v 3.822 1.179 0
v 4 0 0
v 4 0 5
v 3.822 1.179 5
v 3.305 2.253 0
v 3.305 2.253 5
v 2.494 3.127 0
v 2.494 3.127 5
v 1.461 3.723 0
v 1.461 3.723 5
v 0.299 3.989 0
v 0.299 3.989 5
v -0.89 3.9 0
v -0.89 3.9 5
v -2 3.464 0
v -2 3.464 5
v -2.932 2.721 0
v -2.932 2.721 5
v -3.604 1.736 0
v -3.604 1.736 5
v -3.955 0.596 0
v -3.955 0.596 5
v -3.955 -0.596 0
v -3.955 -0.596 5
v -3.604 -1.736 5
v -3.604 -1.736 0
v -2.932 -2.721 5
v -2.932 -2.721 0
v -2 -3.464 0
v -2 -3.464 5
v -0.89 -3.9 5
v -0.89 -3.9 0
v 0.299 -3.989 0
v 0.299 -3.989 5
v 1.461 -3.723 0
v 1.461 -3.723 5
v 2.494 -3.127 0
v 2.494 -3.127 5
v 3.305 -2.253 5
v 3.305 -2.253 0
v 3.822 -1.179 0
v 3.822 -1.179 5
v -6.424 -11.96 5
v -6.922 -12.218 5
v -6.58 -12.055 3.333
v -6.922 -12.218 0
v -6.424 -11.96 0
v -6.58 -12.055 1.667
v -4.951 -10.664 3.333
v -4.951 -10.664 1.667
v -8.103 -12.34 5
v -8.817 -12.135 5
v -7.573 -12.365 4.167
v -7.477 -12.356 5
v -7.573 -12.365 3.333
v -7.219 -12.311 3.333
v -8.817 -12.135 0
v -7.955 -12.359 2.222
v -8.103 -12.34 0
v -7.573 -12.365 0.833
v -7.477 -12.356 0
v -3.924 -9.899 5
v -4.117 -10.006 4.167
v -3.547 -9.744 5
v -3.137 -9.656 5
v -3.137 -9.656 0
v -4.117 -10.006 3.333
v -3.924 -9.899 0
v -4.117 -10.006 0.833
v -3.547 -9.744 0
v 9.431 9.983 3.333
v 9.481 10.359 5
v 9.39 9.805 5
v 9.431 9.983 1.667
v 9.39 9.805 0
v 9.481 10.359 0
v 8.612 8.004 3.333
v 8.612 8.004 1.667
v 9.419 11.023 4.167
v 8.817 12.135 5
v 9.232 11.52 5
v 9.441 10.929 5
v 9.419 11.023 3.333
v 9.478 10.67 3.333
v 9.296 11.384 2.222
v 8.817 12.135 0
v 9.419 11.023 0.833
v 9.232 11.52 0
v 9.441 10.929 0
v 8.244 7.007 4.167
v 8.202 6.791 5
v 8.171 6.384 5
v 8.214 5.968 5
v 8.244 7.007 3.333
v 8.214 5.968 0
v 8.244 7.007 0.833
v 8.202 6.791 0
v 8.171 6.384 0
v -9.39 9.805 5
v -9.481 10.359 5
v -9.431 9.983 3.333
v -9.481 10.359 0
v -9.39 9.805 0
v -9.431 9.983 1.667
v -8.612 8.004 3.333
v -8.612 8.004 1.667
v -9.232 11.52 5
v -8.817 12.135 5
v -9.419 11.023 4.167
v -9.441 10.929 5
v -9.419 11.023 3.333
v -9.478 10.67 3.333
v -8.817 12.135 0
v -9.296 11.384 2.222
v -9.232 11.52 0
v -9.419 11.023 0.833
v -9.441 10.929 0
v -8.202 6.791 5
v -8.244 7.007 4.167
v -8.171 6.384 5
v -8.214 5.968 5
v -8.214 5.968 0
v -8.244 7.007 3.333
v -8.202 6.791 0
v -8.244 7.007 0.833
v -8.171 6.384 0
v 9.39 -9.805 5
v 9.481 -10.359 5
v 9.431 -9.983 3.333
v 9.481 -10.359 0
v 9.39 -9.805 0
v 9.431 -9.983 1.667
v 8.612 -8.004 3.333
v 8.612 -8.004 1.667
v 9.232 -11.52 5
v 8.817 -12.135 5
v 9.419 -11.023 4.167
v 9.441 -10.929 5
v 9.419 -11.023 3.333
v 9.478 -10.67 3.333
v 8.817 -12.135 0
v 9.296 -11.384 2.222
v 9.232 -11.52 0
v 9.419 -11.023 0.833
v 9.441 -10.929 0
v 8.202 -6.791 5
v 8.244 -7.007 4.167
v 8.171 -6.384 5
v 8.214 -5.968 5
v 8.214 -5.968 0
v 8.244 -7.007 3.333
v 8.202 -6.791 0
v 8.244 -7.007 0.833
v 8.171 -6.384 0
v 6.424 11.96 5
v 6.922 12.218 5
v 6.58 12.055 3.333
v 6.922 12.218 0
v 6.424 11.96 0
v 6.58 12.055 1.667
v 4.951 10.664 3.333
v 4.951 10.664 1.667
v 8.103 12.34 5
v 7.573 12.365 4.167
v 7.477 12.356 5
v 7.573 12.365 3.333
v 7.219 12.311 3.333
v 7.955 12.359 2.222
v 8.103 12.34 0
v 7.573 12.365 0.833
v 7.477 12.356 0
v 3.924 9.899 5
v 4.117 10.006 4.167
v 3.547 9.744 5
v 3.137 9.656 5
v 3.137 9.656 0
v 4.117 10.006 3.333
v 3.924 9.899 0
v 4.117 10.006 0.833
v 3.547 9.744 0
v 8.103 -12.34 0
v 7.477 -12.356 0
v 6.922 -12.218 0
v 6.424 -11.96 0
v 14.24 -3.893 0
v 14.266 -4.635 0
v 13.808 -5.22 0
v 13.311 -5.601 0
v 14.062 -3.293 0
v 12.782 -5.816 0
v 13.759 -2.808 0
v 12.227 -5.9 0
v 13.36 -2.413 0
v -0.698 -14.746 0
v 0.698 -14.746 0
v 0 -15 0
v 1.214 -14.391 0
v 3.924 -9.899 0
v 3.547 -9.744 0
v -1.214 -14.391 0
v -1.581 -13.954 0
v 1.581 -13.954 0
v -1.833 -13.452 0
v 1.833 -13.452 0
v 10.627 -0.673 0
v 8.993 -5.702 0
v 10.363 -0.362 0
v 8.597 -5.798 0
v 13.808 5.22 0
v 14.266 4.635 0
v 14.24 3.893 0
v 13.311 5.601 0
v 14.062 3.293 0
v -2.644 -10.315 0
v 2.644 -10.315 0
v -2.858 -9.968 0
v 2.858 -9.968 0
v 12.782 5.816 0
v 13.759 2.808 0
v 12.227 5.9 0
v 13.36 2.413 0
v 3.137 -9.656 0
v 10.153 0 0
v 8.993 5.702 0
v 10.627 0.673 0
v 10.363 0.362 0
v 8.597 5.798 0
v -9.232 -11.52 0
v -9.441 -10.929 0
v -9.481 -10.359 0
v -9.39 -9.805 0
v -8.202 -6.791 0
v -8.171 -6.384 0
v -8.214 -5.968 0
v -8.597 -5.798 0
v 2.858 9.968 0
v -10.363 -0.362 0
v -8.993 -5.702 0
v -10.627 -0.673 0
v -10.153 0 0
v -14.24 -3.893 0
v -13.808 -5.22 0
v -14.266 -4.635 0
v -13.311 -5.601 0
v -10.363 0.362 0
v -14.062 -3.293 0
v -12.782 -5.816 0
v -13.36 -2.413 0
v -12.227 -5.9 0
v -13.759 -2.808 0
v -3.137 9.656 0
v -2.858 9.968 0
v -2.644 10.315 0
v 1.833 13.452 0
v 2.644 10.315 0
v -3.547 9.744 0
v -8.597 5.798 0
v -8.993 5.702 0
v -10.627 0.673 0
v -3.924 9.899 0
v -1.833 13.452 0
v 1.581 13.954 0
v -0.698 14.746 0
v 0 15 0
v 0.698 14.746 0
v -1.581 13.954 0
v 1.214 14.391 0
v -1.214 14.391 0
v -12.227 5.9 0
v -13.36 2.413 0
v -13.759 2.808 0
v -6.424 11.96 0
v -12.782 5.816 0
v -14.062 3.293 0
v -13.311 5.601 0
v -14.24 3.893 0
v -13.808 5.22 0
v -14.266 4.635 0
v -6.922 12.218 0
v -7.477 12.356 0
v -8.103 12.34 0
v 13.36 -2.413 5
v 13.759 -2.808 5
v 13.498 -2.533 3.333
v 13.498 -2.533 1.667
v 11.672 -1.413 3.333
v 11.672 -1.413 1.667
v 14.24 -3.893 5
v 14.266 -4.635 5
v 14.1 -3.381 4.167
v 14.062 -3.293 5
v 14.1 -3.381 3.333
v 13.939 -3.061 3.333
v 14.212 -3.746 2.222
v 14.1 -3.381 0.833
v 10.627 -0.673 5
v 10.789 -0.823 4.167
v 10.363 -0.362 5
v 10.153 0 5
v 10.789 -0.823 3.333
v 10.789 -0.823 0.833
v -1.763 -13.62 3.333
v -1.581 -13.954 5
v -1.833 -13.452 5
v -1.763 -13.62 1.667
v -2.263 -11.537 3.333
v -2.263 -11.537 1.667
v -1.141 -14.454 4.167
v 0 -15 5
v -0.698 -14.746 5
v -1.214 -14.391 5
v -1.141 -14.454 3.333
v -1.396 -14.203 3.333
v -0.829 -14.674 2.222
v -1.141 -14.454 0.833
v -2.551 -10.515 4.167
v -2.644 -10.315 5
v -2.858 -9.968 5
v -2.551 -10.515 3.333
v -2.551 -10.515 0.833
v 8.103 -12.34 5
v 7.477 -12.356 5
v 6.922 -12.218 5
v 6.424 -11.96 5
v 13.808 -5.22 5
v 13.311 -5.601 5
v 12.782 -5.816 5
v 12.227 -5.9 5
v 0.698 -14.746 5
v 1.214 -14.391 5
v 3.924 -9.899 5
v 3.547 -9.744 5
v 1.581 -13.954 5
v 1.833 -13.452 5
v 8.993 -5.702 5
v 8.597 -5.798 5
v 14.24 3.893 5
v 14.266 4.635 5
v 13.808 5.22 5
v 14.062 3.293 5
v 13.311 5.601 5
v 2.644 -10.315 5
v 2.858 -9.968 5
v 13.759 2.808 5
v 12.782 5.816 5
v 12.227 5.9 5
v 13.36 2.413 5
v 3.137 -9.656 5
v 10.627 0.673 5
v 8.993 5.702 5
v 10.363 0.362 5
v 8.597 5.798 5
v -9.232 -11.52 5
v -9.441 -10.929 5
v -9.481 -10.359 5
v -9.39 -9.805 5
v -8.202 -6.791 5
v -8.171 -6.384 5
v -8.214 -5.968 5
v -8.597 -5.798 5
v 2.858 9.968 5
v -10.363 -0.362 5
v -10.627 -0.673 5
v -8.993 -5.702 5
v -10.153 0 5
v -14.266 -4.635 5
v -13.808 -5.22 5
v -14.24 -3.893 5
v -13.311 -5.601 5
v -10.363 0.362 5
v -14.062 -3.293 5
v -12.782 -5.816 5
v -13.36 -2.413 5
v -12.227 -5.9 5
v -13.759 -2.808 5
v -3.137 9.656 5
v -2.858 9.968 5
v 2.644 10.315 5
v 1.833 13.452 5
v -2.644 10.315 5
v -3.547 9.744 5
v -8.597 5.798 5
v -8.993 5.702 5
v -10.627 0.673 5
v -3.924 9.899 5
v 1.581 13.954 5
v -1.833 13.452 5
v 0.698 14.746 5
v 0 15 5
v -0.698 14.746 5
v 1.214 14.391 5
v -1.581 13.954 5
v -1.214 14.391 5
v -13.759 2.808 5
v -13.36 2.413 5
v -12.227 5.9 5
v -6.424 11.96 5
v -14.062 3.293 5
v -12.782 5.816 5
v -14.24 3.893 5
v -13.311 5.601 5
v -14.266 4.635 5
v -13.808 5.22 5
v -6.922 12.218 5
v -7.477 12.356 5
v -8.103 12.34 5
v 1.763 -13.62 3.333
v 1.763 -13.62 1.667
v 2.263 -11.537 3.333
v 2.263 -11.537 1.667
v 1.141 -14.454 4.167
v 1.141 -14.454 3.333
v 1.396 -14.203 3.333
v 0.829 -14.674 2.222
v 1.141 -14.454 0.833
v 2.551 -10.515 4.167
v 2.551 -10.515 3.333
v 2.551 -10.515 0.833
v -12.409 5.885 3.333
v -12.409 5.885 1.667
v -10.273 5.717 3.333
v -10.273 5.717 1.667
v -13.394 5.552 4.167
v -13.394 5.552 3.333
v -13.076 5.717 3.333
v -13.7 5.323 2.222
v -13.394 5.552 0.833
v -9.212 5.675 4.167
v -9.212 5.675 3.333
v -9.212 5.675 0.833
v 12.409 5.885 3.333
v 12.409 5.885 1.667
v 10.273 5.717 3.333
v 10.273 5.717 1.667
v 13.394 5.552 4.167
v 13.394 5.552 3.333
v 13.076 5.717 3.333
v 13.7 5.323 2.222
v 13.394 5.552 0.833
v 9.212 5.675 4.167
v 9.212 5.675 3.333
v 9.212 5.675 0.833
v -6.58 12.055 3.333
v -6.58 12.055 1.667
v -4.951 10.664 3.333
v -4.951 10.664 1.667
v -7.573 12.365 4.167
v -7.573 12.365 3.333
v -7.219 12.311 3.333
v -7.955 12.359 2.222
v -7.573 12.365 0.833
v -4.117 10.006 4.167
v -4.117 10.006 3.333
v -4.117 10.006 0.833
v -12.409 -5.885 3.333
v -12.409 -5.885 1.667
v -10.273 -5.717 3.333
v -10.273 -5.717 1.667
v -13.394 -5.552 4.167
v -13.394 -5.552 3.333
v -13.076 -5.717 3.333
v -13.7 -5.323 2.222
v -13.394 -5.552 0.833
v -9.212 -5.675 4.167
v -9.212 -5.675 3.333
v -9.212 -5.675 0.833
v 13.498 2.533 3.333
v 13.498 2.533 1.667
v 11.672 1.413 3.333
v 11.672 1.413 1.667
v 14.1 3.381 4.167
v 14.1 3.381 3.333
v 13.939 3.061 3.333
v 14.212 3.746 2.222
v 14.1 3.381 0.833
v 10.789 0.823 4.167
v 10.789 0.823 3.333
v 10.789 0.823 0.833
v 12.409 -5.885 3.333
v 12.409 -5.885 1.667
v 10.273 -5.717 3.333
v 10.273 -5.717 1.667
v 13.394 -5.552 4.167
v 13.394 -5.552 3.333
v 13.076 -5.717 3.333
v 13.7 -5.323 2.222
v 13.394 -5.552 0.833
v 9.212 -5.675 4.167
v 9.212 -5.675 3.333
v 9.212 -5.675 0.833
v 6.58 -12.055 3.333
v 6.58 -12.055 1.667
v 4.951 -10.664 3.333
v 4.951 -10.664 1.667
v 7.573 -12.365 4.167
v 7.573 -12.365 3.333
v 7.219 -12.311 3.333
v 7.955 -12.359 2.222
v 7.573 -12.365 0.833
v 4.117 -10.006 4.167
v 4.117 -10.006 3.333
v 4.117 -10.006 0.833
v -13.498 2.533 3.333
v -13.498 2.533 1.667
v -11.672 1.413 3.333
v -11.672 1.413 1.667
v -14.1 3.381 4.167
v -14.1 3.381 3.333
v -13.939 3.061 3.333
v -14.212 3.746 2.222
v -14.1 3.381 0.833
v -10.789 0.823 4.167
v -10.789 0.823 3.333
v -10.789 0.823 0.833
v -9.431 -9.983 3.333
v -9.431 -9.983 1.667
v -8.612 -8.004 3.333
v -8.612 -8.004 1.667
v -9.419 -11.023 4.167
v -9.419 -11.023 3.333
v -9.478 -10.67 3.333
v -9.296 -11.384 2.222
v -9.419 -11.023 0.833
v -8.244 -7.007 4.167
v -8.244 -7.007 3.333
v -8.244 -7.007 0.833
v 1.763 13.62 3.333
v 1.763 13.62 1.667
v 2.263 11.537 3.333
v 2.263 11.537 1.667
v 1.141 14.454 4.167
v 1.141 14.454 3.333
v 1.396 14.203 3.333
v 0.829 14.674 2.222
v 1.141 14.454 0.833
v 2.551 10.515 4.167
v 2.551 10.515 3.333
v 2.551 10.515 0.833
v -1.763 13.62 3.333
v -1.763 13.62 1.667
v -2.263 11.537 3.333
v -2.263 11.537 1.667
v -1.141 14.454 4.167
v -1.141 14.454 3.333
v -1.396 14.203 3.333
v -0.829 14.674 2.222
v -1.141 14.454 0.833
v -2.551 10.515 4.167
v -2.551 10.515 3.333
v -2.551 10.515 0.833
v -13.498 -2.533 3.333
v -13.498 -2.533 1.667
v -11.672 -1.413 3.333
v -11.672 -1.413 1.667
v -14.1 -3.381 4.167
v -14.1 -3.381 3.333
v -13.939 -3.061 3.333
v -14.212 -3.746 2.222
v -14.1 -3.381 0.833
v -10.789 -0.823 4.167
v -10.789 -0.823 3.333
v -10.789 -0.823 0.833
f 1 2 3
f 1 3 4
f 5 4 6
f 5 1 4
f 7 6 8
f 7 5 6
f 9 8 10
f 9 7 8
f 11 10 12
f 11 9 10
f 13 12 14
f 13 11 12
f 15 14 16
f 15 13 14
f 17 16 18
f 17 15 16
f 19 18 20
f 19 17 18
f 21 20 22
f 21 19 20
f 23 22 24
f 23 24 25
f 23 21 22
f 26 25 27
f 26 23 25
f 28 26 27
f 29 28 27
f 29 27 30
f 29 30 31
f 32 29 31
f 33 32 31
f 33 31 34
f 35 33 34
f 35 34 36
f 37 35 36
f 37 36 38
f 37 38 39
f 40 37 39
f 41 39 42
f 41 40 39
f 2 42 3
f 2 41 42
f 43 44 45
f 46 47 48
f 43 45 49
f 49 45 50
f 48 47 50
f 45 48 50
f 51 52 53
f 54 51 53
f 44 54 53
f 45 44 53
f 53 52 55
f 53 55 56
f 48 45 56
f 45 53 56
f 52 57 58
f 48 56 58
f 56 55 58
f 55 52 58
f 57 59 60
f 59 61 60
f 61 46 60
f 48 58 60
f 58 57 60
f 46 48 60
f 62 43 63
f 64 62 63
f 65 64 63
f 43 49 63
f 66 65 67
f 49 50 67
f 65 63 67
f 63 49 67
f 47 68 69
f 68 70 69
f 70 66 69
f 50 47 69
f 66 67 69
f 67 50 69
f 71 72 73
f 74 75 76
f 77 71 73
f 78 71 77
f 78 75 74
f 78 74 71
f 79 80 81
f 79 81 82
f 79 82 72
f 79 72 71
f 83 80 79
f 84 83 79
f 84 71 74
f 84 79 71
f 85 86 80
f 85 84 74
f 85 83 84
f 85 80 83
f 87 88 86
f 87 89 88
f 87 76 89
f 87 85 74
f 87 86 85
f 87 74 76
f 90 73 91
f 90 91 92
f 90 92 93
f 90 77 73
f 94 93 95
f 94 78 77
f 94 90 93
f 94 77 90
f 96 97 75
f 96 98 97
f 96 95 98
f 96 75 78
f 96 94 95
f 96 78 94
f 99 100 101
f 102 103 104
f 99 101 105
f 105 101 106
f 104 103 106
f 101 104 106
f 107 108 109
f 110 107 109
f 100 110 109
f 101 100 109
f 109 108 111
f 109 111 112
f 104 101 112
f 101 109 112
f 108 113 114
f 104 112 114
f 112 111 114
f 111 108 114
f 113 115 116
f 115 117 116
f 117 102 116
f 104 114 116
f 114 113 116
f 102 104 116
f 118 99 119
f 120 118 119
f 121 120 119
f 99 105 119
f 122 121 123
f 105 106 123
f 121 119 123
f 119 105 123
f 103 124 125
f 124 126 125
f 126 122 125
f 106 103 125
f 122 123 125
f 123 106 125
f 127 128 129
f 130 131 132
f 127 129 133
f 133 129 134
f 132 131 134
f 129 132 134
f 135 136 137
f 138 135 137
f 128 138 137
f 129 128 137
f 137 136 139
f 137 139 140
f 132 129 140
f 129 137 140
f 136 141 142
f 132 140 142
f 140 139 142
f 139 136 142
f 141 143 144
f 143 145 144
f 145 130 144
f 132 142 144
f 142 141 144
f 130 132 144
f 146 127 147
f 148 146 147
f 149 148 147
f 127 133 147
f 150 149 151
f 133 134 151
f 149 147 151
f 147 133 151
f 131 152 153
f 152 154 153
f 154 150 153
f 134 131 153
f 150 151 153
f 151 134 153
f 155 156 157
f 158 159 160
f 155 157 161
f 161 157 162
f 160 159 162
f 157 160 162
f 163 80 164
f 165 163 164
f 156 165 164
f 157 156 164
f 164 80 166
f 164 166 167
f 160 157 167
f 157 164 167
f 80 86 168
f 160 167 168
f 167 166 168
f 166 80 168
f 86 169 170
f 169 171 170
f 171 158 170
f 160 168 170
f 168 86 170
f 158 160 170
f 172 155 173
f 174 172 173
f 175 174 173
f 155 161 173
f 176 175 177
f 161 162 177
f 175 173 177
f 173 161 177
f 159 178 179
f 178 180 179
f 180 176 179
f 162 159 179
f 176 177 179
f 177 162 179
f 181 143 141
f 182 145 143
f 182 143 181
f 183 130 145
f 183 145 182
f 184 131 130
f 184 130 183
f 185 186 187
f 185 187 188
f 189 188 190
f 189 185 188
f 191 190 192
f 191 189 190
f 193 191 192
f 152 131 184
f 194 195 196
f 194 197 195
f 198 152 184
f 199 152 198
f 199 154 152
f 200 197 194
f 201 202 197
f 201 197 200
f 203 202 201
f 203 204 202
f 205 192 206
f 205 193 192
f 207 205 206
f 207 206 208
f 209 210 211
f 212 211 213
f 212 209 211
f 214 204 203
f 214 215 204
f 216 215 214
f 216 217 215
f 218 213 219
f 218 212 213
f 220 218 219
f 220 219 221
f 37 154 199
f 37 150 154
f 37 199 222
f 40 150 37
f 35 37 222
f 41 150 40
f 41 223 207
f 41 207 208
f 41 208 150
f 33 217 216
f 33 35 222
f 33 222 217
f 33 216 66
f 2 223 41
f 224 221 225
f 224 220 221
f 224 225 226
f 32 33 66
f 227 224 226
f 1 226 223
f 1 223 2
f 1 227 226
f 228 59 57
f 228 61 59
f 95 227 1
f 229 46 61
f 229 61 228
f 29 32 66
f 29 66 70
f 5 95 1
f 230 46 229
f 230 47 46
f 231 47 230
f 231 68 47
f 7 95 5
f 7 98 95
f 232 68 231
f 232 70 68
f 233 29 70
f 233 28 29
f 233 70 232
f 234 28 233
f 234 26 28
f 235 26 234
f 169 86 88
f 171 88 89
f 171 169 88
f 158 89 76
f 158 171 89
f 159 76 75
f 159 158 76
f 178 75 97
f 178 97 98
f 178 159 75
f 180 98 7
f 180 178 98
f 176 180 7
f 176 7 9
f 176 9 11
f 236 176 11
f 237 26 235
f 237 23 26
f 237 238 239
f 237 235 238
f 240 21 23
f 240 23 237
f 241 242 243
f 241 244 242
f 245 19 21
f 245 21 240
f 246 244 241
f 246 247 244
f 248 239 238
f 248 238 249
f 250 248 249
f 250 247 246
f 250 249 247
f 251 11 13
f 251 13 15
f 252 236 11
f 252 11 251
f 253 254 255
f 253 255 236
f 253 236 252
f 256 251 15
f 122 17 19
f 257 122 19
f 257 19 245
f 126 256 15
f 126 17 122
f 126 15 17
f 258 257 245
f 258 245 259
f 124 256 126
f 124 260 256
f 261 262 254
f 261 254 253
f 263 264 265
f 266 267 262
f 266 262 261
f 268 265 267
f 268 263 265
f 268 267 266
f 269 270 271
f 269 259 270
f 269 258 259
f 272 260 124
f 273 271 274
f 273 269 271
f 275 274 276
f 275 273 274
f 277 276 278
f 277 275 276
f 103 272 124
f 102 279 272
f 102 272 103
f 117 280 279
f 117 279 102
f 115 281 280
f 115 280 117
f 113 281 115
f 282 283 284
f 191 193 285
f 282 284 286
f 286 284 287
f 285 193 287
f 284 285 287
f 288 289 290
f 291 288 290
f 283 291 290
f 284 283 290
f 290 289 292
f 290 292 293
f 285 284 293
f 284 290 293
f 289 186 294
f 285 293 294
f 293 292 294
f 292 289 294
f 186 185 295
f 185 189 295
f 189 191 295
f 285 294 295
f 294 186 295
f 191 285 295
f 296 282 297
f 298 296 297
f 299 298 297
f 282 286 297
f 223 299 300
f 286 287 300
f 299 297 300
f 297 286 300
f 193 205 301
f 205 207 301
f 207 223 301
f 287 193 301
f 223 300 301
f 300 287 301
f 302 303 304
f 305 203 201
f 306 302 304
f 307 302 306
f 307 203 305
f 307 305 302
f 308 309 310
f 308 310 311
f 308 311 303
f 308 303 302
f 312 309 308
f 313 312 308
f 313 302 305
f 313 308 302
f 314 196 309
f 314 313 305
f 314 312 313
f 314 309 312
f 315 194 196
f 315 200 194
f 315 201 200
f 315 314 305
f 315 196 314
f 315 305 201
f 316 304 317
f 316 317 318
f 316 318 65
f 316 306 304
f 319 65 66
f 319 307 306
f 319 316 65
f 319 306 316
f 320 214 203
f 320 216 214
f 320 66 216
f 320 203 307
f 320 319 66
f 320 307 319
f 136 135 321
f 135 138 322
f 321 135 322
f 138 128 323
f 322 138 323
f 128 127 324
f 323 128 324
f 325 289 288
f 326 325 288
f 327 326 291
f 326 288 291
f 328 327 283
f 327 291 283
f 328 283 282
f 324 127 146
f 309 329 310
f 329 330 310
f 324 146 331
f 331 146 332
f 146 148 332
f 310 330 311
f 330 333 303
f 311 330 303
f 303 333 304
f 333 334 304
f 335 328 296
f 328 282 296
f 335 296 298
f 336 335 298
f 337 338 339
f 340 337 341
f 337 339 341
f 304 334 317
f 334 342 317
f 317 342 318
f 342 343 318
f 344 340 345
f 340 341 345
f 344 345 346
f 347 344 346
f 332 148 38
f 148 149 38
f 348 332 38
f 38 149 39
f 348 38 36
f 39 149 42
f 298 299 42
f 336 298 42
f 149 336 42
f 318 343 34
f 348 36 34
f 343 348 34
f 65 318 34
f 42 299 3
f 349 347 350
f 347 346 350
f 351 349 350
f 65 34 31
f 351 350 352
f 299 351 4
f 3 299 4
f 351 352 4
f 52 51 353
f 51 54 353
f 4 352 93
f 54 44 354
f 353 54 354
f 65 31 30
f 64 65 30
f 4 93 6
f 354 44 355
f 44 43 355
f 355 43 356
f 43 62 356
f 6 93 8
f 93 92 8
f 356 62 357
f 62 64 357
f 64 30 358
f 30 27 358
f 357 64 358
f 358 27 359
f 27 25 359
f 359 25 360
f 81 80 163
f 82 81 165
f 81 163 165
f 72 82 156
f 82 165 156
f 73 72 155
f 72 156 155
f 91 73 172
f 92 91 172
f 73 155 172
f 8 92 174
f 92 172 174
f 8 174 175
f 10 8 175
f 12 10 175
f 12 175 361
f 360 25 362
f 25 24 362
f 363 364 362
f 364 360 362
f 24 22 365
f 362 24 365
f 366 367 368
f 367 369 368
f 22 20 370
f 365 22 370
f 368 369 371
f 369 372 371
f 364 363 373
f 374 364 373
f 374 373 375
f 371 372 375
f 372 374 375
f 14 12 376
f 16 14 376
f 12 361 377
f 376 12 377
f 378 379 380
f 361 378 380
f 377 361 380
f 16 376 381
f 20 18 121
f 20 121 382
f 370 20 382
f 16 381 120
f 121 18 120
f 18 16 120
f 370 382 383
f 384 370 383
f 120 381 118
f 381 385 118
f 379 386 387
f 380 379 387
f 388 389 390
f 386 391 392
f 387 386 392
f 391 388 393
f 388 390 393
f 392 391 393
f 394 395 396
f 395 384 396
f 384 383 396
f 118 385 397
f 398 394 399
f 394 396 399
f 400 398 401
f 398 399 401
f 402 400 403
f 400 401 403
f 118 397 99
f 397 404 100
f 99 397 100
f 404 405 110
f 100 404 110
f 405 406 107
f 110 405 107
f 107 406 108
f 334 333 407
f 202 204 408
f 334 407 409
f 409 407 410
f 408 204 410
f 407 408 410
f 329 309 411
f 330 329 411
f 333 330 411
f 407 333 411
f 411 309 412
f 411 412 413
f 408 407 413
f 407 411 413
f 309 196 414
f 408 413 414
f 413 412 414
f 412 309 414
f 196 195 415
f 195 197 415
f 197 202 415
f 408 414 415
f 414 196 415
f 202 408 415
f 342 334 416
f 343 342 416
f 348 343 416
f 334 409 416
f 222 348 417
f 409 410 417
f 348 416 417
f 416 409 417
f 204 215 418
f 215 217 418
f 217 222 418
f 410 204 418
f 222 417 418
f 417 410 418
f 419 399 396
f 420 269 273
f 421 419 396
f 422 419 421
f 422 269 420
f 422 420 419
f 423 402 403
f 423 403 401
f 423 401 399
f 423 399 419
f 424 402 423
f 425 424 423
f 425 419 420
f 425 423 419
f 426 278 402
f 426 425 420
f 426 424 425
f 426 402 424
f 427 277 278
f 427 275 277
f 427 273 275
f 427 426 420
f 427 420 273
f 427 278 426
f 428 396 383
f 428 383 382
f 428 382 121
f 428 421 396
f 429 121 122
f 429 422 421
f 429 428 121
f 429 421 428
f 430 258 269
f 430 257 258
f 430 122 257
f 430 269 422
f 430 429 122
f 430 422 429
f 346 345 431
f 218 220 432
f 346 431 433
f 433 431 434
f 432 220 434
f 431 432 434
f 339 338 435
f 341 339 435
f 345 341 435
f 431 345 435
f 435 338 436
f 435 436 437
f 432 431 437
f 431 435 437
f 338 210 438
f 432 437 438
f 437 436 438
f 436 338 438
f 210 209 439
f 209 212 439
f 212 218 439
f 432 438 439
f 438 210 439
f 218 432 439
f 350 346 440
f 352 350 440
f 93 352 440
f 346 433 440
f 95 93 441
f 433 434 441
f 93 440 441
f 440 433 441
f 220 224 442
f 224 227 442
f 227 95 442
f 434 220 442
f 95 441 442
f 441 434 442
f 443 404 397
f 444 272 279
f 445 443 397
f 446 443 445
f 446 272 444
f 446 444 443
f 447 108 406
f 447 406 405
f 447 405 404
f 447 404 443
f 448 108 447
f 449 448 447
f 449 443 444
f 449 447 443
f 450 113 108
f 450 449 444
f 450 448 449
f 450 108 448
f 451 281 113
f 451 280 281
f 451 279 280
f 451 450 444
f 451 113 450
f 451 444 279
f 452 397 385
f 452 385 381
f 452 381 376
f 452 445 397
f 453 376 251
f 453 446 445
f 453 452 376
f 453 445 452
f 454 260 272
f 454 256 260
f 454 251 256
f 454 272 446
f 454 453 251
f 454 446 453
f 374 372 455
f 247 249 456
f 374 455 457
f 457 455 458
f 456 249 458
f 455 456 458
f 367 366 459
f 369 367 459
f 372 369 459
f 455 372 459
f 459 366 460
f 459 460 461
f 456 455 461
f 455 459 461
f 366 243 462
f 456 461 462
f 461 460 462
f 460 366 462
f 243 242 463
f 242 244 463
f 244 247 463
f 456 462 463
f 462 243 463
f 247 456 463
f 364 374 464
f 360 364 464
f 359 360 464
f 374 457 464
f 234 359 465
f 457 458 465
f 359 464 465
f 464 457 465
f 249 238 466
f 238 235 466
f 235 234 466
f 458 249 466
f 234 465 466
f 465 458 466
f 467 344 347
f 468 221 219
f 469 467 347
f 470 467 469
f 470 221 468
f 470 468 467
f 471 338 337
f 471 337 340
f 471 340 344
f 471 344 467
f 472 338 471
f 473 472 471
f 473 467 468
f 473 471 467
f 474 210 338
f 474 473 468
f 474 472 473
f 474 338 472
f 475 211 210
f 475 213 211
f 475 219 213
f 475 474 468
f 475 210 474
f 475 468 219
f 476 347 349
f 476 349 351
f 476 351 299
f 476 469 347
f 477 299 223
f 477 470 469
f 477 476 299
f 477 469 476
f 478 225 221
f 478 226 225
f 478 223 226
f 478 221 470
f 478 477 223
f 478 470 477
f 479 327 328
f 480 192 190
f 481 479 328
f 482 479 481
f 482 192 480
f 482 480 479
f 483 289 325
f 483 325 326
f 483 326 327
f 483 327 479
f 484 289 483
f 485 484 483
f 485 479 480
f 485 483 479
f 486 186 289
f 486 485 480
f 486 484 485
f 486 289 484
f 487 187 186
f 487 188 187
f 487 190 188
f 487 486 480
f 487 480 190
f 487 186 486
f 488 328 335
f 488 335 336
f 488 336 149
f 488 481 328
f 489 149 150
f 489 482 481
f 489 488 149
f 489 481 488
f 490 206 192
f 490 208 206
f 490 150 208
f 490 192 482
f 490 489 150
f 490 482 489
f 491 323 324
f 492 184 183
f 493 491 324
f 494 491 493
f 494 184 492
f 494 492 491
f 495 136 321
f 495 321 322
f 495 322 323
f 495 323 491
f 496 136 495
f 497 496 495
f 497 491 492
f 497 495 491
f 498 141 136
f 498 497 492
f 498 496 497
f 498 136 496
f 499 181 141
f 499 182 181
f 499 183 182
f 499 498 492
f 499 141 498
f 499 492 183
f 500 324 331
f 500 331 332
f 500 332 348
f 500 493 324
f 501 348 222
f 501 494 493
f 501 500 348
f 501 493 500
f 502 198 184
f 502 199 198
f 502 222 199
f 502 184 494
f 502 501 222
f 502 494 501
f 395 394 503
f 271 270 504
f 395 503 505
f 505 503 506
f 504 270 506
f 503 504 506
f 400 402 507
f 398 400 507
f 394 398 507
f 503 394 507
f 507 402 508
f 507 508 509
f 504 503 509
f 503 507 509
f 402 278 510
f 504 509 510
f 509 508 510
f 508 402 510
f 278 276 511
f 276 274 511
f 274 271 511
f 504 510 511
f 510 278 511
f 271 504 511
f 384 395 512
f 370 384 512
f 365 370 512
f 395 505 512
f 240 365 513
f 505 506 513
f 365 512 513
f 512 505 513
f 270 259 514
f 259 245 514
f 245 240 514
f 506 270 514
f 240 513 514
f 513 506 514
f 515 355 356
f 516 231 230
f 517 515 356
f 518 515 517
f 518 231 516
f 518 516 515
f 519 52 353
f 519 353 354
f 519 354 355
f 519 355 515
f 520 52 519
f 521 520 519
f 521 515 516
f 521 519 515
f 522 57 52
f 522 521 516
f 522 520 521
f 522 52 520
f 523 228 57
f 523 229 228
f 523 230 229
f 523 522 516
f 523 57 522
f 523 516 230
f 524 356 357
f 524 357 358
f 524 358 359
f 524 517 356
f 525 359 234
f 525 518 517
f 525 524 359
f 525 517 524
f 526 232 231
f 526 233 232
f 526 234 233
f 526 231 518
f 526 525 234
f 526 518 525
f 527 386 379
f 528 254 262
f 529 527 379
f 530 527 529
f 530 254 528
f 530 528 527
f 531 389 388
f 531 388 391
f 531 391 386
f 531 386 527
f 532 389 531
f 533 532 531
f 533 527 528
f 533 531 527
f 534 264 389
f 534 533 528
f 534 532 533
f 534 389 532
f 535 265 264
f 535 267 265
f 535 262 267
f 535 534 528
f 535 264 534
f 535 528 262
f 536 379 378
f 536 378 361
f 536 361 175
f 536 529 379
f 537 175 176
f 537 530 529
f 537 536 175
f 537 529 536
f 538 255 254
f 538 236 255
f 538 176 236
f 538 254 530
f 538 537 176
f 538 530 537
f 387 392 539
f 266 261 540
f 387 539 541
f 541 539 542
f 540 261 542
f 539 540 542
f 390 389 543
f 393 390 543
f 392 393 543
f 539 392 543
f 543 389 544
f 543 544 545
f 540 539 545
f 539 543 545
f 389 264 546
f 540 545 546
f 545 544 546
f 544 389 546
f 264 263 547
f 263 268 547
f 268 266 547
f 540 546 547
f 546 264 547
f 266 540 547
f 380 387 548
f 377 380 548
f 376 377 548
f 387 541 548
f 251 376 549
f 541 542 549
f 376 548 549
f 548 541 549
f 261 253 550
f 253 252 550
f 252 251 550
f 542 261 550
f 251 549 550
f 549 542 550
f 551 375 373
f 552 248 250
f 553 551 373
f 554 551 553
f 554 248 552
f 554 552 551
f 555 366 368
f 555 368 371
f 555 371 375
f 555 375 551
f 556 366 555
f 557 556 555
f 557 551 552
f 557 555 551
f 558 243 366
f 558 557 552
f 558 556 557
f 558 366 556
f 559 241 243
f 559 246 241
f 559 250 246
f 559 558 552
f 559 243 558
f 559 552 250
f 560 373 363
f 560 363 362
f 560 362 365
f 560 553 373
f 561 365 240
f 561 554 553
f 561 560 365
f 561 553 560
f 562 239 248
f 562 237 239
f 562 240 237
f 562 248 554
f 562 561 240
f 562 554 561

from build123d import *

# Parameters (mm, degrees)
SKETCH1_R           = 4
BOSS_EXTRUDE1_DEPTH = 5


with BuildPart() as part:
    # Sketch1 → Boss-Extrude1 (new body)
    with BuildSketch(Plane.XY):
        with BuildLine():
            add(Edge.make_bspline(
                [(0, 15), (2.939188217, 14.272515919), (1.529993599, 11.135281605), (3.13745877, 9.656105206)],
                knots=[0, 0, 0, 0, 0.926158454, 0.926158454, 0.926158454, 0.926158454], degree=3))
            add(Edge.make_bspline(
                [(0, 15), (-2.939188224, 14.272515918), (-1.529993593, 11.13528159), (-3.137458782, 9.656105196)],
                knots=[0, 0, 0, 0, 0.926158457, 0.926158457, 0.926158457, 0.926158457], degree=3))
            add(Edge.make_bspline(
                [(-8.816778784, 12.135254916), (-6.01132116, 13.274319416), (-5.307363487, 9.907939744), (-3.137458785, 9.656105208)],
                knots=[0, 0, 0, 0, 0.926158452, 0.926158452, 0.926158452, 0.926158452], degree=3))
            add(Edge.make_bspline(
                [(-8.816778784, 12.135254916), (-10.767027588, 9.819096444), (-7.782945131, 8.109324382), (-8.213973699, 5.967801216)],
                knots=[0, 0, 0, 0, 0.926158454, 0.926158454, 0.926158454, 0.926158454], degree=3))
            add(Edge.make_bspline(
                [(-14.265847744, 4.635254916), (-12.66571016, 7.205784078), (-10.117488108, 4.896101636), (-8.213973699, 5.967801216)],
                knots=[0, 0, 0, 0, 0.926158454, 0.926158454, 0.926158454, 0.926158454], degree=3))
            add(Edge.make_bspline(
                [(-14.265847744, 4.635254916), (-14.482228378, 1.615115865), (-11.063076155, 1.98588087), (-10.153029858, 0)],
                knots=[0, 0, 0, 0, 0.926158454, 0.926158454, 0.926158454, 0.926158454], degree=3))
            add(Edge.make_bspline(
                [(-14.265847744, -4.635254916), (-14.482228378, -1.615115865), (-11.063076155, -1.98588087), (-10.153029858, 0)],
                knots=[0, 0, 0, 0, 0.926158454, 0.926158454, 0.926158454, 0.926158454], degree=3))
            add(Edge.make_bspline(
                [(-14.265847744, -4.635254916), (-12.665710158, -7.205784082), (-10.117488099, -4.896101628), (-8.21397369, -5.967801222)],
                knots=[0, 0, 0, 0, 0.926158456, 0.926158456, 0.926158456, 0.926158456], degree=3))
            add(Edge.make_bspline(
                [(-8.816778784, -12.135254916), (-10.767027584, -9.819096448), (-7.782945142, -8.109324388), (-8.213973697, -5.967801228)],
                knots=[0, 0, 0, 0, 0.926158453, 0.926158453, 0.926158453, 0.926158453], degree=3))
            add(Edge.make_bspline(
                [(-8.816778784, -12.135254916), (-6.01132116, -13.274319416), (-5.307363487, -9.907939744), (-3.137458785, -9.656105208)],
                knots=[0, 0, 0, 0, 0.926158452, 0.926158452, 0.926158452, 0.926158452], degree=3))
            add(Edge.make_bspline(
                [(0, -15), (-2.939188224, -14.272515918), (-1.529993593, -11.13528159), (-3.137458782, -9.656105196)],
                knots=[0, 0, 0, 0, 0.926158457, 0.926158457, 0.926158457, 0.926158457], degree=3))
            add(Edge.make_bspline(
                [(0, -15), (2.939188224, -14.272515918), (1.529993593, -11.13528159), (3.137458782, -9.656105196)],
                knots=[0, 0, 0, 0, 0.926158457, 0.926158457, 0.926158457, 0.926158457], degree=3))
            add(Edge.make_bspline(
                [(8.816778784, -12.135254916), (6.01132116, -13.274319416), (5.307363487, -9.907939744), (3.137458785, -9.656105208)],
                knots=[0, 0, 0, 0, 0.926158452, 0.926158452, 0.926158452, 0.926158452], degree=3))
            add(Edge.make_bspline(
                [(8.816778784, -12.135254916), (10.767027588, -9.819096444), (7.782945131, -8.109324382), (8.213973699, -5.967801216)],
                knots=[0, 0, 0, 0, 0.926158454, 0.926158454, 0.926158454, 0.926158454], degree=3))
            add(Edge.make_bspline(
                [(14.265847744, -4.635254916), (12.66571016, -7.205784078), (10.117488108, -4.896101636), (8.213973699, -5.967801216)],
                knots=[0, 0, 0, 0, 0.926158454, 0.926158454, 0.926158454, 0.926158454], degree=3))
            add(Edge.make_bspline(
                [(14.265847744, -4.635254916), (14.482228378, -1.615115865), (11.063076155, -1.98588087), (10.153029858, 0)],
                knots=[0, 0, 0, 0, 0.926158454, 0.926158454, 0.926158454, 0.926158454], degree=3))
            add(Edge.make_bspline(
                [(14.265847744, 4.635254916), (14.482228378, 1.615115865), (11.063076155, 1.98588087), (10.153029858, 0)],
                knots=[0, 0, 0, 0, 0.926158454, 0.926158454, 0.926158454, 0.926158454], degree=3))
            add(Edge.make_bspline(
                [(14.265847744, 4.635254916), (12.665710158, 7.205784082), (10.117488099, 4.896101628), (8.21397369, 5.967801222)],
                knots=[0, 0, 0, 0, 0.926158456, 0.926158456, 0.926158456, 0.926158456], degree=3))
            add(Edge.make_bspline(
                [(8.816778784, 12.135254916), (10.767027584, 9.819096448), (7.782945142, 8.109324388), (8.213973697, 5.967801228)],
                knots=[0, 0, 0, 0, 0.926158453, 0.926158453, 0.926158453, 0.926158453], degree=3))
            add(Edge.make_bspline(
                [(8.816778784, 12.135254916), (6.011321153, 13.274319419), (5.307363484, 9.907939729), (3.13745877, 9.656105206)],
                knots=[0, 0, 0, 0, 0.926158454, 0.926158454, 0.926158454, 0.926158454], degree=3))
        make_face()
        Circle(SKETCH1_R, mode=Mode.SUBTRACT)
    extrude(amount=BOSS_EXTRUDE1_DEPTH)


solid = part.part
